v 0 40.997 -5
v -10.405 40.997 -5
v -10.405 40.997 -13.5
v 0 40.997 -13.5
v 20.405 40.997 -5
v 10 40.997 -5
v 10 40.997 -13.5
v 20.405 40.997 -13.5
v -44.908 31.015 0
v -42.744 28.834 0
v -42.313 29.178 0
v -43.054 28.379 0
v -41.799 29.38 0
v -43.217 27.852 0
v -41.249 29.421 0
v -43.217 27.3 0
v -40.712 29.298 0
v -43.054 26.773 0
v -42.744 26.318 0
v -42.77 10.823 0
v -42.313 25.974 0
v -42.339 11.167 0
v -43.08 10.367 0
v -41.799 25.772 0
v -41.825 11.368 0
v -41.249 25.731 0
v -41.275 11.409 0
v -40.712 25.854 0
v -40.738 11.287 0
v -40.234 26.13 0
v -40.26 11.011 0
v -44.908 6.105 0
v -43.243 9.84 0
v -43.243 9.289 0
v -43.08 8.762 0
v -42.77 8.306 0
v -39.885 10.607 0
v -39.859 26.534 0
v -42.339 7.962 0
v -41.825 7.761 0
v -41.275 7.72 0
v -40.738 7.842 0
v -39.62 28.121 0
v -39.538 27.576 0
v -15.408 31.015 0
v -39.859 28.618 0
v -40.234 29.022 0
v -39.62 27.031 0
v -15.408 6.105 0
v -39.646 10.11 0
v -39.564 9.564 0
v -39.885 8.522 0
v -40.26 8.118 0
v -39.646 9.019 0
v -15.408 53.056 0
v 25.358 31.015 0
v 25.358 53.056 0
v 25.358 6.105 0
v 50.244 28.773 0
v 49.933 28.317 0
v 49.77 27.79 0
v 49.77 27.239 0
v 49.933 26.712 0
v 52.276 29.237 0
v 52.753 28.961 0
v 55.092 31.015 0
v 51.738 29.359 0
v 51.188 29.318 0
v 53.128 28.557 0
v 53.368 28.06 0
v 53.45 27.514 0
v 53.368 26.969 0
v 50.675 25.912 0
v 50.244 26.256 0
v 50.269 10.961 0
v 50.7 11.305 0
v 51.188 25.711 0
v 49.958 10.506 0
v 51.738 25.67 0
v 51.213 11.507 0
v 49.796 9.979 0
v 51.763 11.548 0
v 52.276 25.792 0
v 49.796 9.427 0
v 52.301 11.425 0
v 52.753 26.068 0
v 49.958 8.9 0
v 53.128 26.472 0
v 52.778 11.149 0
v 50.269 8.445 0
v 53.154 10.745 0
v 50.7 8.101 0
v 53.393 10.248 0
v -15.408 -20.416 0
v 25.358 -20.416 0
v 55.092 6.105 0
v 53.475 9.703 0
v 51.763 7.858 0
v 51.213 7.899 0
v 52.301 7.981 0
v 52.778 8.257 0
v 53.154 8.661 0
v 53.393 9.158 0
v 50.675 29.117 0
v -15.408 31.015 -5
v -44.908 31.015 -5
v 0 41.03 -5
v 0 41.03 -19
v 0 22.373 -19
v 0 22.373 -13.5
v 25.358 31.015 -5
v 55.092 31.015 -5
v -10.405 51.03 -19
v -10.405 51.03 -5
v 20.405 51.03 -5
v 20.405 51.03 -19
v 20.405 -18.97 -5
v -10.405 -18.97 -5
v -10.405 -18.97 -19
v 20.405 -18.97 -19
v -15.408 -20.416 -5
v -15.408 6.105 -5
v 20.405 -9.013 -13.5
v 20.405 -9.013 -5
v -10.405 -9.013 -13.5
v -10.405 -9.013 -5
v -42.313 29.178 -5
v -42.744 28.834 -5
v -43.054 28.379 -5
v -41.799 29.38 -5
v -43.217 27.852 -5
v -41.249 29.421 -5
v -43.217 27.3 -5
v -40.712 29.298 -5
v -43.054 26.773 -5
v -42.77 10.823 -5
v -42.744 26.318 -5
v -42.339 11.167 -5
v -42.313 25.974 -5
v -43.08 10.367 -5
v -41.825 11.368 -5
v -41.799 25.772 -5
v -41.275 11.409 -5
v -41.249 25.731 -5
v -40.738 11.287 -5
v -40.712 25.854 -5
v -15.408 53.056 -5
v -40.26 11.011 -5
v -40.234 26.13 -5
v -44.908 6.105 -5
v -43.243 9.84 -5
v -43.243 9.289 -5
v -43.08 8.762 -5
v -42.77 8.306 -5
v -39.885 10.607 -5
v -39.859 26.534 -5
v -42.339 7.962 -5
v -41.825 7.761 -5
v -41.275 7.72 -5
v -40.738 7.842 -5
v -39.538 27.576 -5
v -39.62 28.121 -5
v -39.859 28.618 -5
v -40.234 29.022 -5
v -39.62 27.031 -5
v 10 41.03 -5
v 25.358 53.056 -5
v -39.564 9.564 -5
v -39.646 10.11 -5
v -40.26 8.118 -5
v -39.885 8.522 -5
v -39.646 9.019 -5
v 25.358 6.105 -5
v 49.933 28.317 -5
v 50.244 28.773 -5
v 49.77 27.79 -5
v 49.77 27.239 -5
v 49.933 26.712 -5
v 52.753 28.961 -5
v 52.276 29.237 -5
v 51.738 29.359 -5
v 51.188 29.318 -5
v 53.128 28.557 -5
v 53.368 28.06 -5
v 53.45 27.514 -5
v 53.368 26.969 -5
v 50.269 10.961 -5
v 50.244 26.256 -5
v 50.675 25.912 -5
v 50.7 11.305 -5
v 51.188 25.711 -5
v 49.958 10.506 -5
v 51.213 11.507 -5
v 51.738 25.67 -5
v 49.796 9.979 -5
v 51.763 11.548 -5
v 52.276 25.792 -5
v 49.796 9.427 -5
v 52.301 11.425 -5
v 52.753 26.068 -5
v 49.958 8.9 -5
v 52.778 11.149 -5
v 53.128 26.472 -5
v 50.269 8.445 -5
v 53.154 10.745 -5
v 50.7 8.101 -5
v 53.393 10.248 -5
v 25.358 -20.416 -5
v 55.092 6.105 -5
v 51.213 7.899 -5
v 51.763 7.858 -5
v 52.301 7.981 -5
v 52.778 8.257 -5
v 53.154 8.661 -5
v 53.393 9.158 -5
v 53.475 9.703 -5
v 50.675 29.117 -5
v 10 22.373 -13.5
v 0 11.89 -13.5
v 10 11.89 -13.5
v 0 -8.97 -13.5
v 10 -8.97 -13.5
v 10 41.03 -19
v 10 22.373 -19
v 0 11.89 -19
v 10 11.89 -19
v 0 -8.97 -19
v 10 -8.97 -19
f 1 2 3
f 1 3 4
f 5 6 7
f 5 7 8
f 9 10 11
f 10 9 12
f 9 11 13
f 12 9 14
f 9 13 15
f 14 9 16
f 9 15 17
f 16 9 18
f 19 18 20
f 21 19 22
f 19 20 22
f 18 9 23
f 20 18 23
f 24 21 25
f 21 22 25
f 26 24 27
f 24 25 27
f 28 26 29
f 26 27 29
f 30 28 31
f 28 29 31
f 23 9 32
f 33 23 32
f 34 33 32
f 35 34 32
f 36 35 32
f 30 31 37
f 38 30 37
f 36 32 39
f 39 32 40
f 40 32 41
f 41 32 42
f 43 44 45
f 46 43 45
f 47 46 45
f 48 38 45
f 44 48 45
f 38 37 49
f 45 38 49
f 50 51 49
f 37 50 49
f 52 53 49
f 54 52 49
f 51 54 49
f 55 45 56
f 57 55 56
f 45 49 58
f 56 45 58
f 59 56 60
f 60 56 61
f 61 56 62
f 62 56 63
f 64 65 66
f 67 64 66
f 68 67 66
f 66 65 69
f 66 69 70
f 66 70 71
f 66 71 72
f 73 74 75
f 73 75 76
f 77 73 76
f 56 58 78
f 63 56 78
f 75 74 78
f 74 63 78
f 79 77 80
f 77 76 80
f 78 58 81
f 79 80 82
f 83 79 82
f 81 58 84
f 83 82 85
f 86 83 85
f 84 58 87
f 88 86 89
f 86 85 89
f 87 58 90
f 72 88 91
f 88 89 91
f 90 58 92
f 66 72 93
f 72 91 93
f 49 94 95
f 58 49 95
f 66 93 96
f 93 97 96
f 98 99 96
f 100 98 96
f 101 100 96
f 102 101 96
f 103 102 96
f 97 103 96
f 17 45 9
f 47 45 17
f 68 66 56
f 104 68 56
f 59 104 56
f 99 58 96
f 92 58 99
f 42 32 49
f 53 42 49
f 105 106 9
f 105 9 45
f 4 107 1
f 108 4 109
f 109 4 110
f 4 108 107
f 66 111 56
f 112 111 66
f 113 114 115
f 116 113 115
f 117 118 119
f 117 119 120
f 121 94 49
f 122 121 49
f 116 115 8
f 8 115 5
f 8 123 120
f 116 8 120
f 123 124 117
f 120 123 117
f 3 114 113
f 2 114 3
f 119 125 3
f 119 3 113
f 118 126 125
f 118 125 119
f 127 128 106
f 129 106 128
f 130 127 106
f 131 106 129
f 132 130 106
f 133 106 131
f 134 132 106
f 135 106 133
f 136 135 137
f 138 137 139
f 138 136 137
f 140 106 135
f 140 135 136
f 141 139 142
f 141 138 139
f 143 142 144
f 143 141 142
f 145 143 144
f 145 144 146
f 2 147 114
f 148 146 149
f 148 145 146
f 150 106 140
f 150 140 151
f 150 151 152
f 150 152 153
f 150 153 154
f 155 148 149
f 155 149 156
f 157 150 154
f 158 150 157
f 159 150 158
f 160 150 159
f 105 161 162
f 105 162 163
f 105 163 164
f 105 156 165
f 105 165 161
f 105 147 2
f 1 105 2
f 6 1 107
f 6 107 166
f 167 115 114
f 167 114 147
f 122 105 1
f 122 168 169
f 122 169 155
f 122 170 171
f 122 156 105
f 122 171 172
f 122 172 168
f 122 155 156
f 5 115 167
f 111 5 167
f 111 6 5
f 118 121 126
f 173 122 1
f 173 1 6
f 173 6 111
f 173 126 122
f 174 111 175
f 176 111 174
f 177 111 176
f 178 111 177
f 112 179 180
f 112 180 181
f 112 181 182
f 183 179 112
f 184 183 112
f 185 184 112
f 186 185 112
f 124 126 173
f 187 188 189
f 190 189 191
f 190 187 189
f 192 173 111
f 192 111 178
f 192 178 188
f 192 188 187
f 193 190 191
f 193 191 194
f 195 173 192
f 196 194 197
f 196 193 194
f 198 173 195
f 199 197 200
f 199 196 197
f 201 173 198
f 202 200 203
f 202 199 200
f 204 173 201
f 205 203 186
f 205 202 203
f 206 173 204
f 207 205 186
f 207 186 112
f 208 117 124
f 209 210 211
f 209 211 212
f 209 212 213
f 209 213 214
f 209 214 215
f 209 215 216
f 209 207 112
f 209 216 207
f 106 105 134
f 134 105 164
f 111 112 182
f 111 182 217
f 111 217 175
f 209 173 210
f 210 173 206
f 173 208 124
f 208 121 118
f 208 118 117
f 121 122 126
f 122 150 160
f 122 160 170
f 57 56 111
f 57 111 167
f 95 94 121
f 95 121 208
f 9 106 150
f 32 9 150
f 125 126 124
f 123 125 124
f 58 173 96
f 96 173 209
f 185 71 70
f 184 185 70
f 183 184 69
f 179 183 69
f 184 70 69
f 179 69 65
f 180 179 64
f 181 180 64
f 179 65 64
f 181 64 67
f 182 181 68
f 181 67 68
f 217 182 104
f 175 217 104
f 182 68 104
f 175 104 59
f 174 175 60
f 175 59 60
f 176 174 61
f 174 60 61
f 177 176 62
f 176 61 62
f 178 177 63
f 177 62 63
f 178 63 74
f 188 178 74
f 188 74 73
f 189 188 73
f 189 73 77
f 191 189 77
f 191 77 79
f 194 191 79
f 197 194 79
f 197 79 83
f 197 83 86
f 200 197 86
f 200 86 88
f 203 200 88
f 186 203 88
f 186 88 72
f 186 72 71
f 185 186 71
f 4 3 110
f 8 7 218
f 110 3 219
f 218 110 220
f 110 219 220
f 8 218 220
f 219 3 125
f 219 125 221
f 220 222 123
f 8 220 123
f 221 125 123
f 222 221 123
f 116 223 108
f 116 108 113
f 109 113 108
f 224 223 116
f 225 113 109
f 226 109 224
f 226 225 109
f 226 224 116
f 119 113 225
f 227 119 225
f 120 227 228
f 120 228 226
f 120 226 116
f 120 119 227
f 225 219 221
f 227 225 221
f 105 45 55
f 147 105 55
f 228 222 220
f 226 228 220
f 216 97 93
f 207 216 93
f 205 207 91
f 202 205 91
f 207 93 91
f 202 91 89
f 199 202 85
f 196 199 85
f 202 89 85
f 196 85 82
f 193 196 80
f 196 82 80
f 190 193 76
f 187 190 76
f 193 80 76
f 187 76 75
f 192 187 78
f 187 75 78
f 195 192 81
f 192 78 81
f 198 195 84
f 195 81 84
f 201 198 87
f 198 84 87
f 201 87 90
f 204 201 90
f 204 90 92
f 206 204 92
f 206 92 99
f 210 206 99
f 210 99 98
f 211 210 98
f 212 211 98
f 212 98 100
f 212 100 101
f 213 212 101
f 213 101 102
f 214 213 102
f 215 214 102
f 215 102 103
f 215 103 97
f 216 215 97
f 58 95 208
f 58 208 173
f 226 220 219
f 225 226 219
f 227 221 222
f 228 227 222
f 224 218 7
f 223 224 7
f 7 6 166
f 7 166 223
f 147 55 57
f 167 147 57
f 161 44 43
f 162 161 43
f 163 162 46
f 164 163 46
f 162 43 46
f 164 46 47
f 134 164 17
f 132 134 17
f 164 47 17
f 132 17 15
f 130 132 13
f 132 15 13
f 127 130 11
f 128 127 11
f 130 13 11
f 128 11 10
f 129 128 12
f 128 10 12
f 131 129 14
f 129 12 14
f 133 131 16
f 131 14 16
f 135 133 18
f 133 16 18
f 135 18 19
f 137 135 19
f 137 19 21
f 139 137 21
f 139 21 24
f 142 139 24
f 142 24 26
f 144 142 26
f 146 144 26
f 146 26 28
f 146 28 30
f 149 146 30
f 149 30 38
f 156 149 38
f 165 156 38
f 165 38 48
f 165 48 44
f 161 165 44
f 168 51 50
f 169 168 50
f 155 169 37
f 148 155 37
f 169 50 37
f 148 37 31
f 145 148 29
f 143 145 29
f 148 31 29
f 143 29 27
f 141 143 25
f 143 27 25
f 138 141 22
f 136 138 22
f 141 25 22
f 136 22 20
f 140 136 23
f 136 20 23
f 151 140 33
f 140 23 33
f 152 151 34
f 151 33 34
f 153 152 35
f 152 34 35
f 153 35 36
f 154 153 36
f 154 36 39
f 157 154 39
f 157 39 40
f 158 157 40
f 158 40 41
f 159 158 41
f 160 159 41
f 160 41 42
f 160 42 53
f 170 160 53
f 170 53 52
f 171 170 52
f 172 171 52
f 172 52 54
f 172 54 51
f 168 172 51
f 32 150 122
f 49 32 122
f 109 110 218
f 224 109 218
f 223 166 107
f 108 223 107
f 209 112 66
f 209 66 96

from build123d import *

# Parameters (mm, degrees)
F0_W     = 40.765519
F0_H     = 73.471674
F1_DEPTH = 5
F2_W     = 30.81081
F2_H     = 70
F3_DEPTH = 14
F4_W     = 35
F4_H     = 50.010137
F5_DEPTH = 8.5
F6_W     = 100
F6_H     = 24.910029
F7_DEPTH = 5
F8_R     = 1.85
F9_DEPTH = 25.4


with BuildPart() as f1:
    # F0 (on Top) → F1 (new body)
    with BuildSketch(Plane.XY):
        with Locations((4.975075, 16.320152)):
            Rectangle(F0_W, F0_H)
    extrude(amount=-F1_DEPTH)

    # F2 (on face) → F3 (join)
    with BuildSketch(Plane(origin=(0, 0, -5), x_dir=(1, 0, 0), z_dir=(0, 0, -1))):
        with Locations((5, -16.029622)):
            Rectangle(F2_W, F2_H)
        Polygon((10, -41.029622), (5, -41.029622), (0, -41.029622), (0, -22.373011), (10, -22.373011), align=None, mode=Mode.SUBTRACT)
        Polygon((0, 8.970378), (5, 8.970378), (10, 8.970378), (10, -11.889663), (0, -11.889663), align=None, mode=Mode.SUBTRACT)
    extrude(amount=F3_DEPTH)

    # F4 (on face) → F5 (cut)
    with BuildSketch(Plane(origin=(0, 0, -5), x_dir=(1, 0, 0), z_dir=(0, 0, -1))):
        with Locations((2.905405, -15.991903)):
            Rectangle(F4_W, F4_H)
    extrude(amount=F5_DEPTH, mode=Mode.SUBTRACT)

    # F6 (on face) → F7 (join)
    with BuildSketch(Plane(origin=(0, 0, -5), x_dir=(1, 0, 0), z_dir=(0, 0, -1))):
        with Locations((5.092296, -18.559826)):
            Rectangle(F6_W, F6_H)
    extrude(amount=-F7_DEPTH)

    # F8 (on face) → F9 (cut)
    with BuildSketch(Plane.XY):
        with Locations((-41.387634, 27.575926)):
            Circle(F8_R)
        with Locations((51.599746, 27.514396)):
            Circle(F8_R)
        with Locations((-41.413683, 9.564399)):
            Circle(F8_R)
        with Locations((51.624972, 9.70294)):
            Circle(F8_R)
    extrude(amount=-F9_DEPTH, mode=Mode.SUBTRACT)


solid = f1.part
